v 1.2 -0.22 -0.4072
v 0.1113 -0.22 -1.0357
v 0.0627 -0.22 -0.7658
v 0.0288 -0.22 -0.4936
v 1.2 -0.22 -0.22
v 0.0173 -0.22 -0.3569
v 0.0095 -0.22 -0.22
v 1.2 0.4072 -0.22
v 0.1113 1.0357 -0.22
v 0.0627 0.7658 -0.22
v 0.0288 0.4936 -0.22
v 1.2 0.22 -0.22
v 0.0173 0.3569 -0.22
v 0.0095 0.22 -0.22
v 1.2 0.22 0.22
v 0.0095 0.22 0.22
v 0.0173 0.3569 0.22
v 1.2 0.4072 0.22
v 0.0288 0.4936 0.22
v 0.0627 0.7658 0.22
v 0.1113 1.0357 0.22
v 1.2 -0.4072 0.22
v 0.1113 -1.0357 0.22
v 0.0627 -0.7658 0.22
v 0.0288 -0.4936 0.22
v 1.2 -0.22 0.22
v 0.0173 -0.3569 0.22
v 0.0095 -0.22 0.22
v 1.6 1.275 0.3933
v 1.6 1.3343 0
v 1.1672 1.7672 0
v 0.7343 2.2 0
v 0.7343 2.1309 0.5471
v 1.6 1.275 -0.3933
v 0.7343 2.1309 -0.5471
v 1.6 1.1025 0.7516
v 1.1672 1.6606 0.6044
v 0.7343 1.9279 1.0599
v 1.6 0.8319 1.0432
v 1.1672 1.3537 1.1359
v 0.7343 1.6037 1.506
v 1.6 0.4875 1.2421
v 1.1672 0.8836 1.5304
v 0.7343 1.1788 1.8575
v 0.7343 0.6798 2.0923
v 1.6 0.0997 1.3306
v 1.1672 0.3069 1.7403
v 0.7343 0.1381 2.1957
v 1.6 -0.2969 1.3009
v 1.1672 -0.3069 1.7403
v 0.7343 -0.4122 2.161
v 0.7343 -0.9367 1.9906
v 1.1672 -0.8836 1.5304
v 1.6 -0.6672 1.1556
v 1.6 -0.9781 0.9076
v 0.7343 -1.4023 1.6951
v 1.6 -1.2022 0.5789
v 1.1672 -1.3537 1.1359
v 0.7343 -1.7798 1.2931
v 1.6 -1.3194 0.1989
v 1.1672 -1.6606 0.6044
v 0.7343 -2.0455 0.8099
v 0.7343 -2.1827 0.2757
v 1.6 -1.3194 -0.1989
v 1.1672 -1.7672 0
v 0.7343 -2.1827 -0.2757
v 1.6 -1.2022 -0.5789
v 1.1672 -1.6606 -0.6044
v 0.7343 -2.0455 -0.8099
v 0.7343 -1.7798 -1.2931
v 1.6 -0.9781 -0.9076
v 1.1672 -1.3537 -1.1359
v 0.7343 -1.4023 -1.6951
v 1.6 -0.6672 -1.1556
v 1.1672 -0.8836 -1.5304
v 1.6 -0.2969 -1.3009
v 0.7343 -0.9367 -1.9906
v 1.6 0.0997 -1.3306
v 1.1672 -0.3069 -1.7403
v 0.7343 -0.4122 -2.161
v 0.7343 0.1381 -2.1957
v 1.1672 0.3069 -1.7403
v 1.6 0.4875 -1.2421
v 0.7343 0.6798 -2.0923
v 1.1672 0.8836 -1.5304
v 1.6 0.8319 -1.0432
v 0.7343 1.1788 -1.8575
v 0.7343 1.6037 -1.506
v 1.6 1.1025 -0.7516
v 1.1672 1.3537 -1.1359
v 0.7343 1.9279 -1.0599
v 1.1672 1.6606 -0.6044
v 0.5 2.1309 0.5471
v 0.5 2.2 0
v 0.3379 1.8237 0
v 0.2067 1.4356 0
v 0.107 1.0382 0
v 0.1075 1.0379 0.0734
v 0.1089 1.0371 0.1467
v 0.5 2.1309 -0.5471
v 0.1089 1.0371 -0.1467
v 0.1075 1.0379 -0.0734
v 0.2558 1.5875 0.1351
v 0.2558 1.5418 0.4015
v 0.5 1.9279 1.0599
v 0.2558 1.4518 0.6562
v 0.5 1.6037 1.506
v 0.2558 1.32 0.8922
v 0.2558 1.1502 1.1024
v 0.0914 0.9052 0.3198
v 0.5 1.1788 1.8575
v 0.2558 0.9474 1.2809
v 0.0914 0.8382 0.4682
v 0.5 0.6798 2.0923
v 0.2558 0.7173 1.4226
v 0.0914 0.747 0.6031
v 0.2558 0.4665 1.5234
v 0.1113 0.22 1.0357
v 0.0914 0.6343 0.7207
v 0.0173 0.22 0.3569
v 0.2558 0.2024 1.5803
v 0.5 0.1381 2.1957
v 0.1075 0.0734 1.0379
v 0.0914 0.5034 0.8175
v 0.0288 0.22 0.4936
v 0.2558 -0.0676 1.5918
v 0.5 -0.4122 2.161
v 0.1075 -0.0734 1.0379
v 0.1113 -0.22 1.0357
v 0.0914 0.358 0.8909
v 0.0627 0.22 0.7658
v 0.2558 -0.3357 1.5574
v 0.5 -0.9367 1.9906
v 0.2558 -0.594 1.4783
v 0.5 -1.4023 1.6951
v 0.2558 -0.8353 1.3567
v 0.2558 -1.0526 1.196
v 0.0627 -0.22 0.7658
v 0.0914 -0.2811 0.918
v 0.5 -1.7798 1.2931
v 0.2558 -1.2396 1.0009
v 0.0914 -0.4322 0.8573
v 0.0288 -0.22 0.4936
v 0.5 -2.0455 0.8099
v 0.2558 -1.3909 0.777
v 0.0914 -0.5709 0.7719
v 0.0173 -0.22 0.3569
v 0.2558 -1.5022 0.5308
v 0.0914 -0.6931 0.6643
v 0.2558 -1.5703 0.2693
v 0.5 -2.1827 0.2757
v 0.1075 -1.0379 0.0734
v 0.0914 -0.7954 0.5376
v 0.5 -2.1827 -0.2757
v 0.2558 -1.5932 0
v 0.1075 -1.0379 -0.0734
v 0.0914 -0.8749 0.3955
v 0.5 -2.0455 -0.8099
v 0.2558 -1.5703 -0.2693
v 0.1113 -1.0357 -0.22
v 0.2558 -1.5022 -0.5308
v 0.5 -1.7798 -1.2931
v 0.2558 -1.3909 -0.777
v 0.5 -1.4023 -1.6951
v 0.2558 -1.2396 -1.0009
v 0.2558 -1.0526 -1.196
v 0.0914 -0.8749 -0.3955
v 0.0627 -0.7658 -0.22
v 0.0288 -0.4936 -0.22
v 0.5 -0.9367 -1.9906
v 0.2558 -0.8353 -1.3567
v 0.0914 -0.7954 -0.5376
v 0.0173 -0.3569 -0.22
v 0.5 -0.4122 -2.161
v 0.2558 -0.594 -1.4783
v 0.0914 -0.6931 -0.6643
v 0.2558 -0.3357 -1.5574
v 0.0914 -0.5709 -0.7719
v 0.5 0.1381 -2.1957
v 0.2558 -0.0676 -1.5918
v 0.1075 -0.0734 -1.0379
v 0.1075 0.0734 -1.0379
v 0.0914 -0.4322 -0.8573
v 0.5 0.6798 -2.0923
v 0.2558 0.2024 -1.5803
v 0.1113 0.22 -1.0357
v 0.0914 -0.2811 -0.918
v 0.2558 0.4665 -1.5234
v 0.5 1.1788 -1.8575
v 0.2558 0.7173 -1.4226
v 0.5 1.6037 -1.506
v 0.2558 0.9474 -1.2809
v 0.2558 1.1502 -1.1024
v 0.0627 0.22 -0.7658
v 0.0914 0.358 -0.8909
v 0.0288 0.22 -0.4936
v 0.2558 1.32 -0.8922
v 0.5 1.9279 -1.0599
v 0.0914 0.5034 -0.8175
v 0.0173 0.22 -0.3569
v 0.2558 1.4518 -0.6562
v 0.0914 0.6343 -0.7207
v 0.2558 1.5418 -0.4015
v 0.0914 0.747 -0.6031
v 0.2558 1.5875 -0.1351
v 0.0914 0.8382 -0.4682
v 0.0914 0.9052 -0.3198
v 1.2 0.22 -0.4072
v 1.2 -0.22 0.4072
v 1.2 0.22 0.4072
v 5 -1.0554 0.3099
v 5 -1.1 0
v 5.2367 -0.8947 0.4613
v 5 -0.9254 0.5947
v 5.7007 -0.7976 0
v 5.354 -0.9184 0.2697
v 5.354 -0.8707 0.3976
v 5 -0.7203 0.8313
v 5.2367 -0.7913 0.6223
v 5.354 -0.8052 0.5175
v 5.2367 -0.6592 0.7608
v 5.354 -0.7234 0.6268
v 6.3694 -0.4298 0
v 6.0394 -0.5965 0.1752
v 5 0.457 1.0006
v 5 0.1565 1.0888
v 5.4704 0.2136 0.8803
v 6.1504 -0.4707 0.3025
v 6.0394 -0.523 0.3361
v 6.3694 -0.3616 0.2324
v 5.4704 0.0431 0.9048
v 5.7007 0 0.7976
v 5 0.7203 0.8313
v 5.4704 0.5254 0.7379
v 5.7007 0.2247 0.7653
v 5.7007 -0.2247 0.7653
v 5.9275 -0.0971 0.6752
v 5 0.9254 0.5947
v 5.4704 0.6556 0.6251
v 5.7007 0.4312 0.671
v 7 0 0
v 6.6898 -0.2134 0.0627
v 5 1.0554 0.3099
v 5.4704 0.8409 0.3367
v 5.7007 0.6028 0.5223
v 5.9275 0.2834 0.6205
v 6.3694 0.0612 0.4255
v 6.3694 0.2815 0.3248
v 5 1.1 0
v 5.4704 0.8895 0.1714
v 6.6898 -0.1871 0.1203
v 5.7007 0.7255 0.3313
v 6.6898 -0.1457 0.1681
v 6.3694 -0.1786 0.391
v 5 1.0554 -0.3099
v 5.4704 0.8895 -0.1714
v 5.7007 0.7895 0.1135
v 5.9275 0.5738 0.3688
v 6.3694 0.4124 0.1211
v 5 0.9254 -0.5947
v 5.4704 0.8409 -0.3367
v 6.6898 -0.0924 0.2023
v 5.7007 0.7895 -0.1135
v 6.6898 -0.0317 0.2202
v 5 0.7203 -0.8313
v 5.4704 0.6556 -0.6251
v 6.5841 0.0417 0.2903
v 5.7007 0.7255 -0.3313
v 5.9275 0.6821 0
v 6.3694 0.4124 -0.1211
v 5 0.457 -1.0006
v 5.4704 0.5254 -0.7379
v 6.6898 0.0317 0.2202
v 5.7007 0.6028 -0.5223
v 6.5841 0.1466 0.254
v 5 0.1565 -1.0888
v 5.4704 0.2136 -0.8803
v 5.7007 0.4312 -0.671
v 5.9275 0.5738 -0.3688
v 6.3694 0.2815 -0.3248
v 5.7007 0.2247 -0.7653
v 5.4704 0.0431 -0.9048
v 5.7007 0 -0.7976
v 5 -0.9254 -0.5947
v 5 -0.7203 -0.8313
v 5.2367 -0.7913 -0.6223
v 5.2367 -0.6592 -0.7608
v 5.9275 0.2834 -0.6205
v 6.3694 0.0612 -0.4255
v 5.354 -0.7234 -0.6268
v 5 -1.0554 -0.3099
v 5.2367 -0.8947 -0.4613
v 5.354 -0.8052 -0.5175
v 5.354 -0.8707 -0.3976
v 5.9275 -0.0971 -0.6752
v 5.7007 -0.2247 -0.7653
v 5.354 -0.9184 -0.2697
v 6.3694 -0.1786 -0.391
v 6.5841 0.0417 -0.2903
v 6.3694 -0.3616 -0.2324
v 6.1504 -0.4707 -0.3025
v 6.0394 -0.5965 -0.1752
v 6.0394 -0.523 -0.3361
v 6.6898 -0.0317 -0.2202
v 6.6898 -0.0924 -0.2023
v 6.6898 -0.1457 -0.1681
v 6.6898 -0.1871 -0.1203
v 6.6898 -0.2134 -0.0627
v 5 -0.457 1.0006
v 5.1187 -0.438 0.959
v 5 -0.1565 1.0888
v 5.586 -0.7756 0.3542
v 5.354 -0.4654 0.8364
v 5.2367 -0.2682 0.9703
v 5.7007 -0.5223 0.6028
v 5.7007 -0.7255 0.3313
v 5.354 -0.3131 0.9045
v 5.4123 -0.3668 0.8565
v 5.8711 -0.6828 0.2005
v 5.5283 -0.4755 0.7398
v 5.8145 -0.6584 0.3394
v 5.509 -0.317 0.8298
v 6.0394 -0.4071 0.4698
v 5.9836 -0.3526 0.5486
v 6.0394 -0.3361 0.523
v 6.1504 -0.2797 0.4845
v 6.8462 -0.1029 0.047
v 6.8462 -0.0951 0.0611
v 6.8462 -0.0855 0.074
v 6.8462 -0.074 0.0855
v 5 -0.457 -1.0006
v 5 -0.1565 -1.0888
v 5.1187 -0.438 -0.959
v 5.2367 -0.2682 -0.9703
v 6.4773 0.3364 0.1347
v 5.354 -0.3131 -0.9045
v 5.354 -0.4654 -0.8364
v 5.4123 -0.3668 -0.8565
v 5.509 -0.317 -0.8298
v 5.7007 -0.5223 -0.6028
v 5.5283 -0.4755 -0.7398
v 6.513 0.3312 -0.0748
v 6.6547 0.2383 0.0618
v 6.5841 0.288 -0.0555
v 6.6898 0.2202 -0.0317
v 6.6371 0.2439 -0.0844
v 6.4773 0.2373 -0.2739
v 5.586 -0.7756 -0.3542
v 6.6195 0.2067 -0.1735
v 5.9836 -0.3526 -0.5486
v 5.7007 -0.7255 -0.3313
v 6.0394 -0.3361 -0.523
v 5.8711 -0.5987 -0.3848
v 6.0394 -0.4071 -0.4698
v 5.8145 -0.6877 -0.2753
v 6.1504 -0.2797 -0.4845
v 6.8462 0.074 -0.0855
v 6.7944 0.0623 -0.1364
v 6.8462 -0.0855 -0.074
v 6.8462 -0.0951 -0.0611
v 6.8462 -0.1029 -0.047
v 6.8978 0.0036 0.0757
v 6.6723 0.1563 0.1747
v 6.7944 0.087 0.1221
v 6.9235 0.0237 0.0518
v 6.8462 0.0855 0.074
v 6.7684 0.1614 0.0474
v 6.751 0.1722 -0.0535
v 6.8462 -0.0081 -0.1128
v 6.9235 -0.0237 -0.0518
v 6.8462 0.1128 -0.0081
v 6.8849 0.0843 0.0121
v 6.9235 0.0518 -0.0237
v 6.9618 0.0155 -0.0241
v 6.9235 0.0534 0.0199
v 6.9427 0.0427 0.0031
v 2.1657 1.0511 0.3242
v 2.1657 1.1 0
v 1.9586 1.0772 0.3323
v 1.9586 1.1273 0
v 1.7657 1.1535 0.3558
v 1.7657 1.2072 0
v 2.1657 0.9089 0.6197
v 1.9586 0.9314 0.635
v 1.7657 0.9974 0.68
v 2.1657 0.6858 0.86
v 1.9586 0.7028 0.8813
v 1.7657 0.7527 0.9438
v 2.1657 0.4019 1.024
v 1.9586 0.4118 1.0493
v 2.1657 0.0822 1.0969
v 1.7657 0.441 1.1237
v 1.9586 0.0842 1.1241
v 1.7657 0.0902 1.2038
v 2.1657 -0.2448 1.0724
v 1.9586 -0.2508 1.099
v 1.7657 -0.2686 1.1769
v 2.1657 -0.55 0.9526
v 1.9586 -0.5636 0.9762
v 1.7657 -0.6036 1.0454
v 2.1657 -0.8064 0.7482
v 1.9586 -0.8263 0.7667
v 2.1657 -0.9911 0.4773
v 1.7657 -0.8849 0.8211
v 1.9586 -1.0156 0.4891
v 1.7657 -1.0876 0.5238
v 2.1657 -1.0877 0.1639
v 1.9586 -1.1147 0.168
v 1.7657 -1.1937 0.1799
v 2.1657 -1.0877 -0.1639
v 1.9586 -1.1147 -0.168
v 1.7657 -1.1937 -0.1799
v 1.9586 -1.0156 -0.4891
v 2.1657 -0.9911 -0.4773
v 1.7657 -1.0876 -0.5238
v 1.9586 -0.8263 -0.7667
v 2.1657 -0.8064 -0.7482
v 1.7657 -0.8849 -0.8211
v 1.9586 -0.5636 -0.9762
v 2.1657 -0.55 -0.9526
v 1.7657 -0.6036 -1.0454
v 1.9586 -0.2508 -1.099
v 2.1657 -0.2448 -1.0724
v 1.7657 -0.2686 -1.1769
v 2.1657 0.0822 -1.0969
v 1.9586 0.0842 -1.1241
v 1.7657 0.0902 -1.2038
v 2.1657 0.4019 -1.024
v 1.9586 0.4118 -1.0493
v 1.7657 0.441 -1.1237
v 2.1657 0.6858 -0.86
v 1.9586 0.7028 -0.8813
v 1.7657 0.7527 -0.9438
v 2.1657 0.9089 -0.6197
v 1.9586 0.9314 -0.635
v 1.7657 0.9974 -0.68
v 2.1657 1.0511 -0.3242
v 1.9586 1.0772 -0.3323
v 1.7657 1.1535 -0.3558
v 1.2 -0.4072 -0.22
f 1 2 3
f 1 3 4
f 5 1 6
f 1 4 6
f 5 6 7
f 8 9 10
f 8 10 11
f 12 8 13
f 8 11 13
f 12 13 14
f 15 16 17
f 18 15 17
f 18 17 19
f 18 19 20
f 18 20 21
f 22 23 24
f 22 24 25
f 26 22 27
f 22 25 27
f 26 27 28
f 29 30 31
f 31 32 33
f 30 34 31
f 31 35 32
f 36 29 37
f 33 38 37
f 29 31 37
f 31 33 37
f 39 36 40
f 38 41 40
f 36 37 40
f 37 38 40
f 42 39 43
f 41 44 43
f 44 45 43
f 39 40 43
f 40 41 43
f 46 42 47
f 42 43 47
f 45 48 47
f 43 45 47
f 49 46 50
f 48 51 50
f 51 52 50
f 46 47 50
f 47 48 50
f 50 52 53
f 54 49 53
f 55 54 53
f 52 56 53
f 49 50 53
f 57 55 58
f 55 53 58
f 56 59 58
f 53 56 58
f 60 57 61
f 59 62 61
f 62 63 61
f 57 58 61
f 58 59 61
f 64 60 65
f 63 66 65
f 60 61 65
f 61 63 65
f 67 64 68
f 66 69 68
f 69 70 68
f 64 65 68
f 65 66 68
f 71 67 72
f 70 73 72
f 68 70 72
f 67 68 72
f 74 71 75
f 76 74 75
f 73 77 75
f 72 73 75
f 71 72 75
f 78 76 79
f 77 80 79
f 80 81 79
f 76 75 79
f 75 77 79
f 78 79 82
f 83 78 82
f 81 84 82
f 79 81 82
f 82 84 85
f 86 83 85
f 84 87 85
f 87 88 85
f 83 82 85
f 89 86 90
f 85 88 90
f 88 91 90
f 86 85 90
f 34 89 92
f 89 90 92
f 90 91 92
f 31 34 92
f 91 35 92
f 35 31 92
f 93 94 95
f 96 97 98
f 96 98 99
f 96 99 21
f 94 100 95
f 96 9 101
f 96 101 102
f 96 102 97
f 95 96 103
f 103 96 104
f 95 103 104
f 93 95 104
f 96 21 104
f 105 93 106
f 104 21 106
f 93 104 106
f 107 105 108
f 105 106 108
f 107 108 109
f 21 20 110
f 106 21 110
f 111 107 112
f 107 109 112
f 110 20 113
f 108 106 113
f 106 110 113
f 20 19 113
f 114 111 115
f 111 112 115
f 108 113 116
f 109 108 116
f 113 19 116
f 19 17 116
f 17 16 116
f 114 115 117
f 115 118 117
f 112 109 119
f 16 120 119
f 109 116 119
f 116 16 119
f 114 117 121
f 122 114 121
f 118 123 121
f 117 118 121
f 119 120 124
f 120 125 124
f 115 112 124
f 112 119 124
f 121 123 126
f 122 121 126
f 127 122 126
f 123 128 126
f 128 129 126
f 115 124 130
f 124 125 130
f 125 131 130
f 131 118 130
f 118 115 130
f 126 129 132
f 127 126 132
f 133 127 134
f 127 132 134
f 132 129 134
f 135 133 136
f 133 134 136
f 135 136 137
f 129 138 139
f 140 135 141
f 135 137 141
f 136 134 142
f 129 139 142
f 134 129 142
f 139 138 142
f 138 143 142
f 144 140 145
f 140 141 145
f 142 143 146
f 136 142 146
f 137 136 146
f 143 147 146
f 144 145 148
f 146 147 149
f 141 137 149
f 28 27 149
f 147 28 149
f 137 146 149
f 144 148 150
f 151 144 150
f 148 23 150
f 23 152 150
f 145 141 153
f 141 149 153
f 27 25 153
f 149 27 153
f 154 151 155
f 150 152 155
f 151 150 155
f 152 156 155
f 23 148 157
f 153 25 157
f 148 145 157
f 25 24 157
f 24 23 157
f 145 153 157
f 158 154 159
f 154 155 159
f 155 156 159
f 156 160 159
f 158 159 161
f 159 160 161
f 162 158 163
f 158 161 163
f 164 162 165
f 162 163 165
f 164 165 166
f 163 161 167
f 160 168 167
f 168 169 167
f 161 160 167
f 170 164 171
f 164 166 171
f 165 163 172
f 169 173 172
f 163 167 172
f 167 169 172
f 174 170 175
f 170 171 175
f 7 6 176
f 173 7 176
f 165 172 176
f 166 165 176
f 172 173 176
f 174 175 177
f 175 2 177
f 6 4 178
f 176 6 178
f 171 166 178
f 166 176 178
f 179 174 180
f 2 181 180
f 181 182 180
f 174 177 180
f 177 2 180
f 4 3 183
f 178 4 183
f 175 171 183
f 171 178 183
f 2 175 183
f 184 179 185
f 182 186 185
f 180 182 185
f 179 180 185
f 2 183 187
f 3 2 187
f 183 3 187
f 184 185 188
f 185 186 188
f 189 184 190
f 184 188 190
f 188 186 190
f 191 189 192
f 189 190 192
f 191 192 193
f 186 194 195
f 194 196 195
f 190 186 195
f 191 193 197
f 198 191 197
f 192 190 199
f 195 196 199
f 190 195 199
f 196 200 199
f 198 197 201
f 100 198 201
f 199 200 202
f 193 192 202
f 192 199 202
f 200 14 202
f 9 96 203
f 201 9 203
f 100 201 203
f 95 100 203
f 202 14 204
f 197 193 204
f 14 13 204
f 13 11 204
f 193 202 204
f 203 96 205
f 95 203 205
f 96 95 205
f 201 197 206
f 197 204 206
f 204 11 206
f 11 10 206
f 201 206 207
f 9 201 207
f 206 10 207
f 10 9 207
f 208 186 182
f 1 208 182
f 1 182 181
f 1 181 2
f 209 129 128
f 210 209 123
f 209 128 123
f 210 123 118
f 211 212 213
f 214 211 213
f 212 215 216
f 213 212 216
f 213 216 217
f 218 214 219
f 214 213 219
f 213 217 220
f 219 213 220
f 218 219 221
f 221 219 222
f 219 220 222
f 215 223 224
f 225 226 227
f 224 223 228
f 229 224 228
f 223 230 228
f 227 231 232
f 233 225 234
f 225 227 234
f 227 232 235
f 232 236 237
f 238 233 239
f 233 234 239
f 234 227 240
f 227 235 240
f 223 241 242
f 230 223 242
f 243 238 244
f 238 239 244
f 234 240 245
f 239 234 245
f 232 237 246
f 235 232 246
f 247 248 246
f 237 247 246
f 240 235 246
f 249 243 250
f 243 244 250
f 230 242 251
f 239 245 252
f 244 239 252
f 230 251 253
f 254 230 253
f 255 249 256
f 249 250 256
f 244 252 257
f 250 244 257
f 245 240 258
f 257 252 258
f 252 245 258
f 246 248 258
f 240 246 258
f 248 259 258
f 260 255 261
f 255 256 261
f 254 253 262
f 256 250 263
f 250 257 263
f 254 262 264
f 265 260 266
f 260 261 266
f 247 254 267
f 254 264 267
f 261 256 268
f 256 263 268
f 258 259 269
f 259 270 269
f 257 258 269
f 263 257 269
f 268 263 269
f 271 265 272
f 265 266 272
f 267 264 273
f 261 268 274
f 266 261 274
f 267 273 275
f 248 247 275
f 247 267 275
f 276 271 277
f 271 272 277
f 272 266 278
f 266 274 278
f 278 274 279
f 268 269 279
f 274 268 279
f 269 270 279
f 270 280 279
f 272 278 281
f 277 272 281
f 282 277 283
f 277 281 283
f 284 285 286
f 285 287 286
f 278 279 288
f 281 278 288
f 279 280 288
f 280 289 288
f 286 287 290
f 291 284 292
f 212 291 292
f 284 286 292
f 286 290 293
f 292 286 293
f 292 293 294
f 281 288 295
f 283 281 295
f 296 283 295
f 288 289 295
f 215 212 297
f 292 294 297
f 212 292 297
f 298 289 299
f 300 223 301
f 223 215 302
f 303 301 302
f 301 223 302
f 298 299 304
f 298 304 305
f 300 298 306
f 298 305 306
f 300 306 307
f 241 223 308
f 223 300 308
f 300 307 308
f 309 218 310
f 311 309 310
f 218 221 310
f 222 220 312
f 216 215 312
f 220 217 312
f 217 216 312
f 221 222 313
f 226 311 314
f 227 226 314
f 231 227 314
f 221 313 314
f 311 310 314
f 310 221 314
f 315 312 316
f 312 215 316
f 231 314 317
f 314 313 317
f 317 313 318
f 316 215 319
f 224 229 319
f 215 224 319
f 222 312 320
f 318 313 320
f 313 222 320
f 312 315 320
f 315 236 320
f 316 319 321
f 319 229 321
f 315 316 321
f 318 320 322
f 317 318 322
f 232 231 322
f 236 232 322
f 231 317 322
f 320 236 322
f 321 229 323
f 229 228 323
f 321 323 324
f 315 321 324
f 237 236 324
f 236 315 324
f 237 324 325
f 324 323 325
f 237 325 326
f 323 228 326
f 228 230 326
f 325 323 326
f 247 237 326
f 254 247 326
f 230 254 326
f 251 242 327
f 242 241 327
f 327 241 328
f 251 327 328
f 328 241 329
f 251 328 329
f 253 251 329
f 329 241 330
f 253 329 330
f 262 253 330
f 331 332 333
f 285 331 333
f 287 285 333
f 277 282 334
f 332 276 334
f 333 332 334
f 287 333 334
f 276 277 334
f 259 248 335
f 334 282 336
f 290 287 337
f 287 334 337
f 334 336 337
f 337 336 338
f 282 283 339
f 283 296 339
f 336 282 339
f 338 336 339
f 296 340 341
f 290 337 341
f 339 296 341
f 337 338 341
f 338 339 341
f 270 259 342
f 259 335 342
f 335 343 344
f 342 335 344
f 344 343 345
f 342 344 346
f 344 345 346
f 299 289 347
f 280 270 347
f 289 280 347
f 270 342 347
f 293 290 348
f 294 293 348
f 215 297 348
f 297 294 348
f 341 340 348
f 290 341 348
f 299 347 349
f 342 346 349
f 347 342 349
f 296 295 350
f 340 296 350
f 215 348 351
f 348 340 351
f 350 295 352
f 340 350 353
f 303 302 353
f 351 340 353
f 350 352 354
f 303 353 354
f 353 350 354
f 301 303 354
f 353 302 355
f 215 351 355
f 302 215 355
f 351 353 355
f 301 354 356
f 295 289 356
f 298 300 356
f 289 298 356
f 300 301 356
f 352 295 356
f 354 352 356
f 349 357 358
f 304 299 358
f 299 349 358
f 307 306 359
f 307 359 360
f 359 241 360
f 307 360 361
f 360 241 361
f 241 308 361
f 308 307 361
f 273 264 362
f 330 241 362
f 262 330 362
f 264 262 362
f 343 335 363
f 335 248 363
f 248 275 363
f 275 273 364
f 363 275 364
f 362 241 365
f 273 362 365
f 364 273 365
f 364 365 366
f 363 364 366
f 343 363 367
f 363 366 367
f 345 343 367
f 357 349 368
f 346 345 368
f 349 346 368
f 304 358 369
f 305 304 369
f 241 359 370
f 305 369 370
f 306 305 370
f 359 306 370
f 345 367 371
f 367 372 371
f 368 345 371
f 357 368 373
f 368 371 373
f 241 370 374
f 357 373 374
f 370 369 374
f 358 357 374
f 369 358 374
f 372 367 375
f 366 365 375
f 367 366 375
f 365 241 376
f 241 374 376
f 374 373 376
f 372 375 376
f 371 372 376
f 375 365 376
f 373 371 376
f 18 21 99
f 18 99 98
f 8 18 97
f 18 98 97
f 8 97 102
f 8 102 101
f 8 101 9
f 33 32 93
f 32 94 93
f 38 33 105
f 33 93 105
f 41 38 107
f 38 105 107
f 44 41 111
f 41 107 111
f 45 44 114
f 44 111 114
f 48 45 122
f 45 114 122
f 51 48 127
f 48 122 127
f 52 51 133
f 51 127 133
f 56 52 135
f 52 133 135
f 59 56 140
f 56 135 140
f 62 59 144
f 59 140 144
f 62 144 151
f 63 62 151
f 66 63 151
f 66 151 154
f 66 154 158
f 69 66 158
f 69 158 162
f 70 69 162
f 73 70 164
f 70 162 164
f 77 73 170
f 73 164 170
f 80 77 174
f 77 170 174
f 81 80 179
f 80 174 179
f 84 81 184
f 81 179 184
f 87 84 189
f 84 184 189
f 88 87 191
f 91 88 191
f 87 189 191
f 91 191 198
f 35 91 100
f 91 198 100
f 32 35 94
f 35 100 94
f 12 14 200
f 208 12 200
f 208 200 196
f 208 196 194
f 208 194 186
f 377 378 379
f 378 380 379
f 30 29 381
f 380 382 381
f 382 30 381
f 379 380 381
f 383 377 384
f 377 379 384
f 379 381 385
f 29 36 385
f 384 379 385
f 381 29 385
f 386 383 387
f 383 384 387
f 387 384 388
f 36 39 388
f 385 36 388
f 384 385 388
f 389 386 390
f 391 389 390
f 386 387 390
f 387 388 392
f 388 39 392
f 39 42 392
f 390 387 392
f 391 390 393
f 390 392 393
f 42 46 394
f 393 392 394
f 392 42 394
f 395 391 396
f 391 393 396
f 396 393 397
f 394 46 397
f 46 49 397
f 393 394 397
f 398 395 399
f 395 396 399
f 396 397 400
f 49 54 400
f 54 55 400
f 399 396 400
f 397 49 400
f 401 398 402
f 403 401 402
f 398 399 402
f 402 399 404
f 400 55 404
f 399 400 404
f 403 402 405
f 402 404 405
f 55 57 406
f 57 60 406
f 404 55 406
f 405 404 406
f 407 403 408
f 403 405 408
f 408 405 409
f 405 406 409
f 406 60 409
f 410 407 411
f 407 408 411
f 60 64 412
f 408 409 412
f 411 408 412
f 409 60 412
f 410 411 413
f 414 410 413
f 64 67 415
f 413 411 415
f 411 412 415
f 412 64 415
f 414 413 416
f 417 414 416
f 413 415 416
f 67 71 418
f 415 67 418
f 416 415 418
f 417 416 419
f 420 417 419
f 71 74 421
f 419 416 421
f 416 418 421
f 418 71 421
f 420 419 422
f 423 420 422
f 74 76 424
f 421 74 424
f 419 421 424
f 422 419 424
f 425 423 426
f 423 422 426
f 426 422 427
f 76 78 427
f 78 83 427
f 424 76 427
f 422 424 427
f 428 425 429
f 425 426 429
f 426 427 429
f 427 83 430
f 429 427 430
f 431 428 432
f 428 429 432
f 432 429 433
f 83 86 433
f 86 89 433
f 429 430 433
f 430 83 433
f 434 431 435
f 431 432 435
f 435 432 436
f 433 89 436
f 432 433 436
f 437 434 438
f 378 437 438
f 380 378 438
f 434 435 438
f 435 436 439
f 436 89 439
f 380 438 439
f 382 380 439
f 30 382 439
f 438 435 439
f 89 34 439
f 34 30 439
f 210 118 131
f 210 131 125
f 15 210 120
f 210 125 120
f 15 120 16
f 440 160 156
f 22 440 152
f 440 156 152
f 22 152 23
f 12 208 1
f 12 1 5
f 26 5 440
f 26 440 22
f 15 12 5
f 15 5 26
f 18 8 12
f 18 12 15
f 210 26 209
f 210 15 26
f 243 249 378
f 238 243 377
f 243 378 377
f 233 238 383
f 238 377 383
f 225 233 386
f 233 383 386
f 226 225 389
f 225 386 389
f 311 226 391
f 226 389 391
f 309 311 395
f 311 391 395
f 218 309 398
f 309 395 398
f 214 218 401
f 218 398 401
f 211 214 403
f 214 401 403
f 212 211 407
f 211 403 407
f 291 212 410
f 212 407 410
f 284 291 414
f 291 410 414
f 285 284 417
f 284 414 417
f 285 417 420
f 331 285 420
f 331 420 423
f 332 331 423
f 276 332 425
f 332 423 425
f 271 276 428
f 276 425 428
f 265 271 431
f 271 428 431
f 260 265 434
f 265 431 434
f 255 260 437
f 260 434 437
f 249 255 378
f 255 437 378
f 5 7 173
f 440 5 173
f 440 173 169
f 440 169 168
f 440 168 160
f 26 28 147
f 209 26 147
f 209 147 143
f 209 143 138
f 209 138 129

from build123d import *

# Parameters (mm, degrees)
CROSSRECESS_DEPTH = 1.2
DRAFT1_ANGLE      = -30


with BuildPart() as part:
    # Sketch1 → Base (revolve)
    with BuildSketch(Plane.XY):
        with BuildLine():
            Line((7, 0), (7, 1.1))
            Line((7, 1.1), (2.165685425, 1.1))
            ThreePointArc((2.165685425, 1.1), (1.859538679, 1.160896374), (1.6, 1.334314575))
            Line((1.6, 1.334314575), (0.734314575, 2.2))
            Line((0.734314575, 2.2), (0.5, 2.2))
            ThreePointArc((0.5, 2.2), (0.126573764, 1.128051417), (0, 0))
            Line((0, 0), (7, 0))
        make_face()
    revolve(axis=Axis((-20.418228315, 0, 0), (1, 0, 0)))

    # Sketch2 → CrossRecess (cut)
    with BuildSketch(Plane(origin=(0, 0, 0), x_dir=(0, 0, -1), z_dir=(1, 0, 0))):
        Polygon((-0.22, 1.1), (0.22, 1.1), (0.22, 0.22), (1.1, 0.22), (1.1, -0.22), (0.22, -0.22), (0.22, -1.1), (-0.22, -1.1), (-0.22, -0.22), (-1.1, -0.22), (-1.1, 0.22), (-0.22, 0.22), align=None)
    extrude(amount=CROSSRECESS_DEPTH, mode=Mode.SUBTRACT)

    # Sketch5 → Cut-Revolve6 (revolve, cut)
    with BuildSketch(Plane.XY):
        with BuildLine():
            Line((7, 0), (7.5, 0))
            Line((7.5, 0), (7.5, -1.1))
            Line((7.5, -1.1), (7, -1.1))
            Line((7, -1.1), (5, -1.1))
            ThreePointArc((5, -1.1), (6.03943286, -0.621696108), (7, 0))
        make_face()
    revolve(axis=Axis((37.040663239, 0, 0), (-1, 0, 0)), mode=Mode.SUBTRACT)

    # Draft1
    draft1_faces = [part.faces().sort_by_distance(p)[0] for p in [
        (0.660951691, -1.1, 0),
        (0.660951691, 0, -1.1),
        (0.660951691, 0, 1.1),
        (0.660951691, 1.1, 0),
    ]]
    draft(draft1_faces, Plane(origin=(0, 0, 0), x_dir=(0, 0, 1), z_dir=(1, 0, 0)), DRAFT1_ANGLE)


solid = part.part
